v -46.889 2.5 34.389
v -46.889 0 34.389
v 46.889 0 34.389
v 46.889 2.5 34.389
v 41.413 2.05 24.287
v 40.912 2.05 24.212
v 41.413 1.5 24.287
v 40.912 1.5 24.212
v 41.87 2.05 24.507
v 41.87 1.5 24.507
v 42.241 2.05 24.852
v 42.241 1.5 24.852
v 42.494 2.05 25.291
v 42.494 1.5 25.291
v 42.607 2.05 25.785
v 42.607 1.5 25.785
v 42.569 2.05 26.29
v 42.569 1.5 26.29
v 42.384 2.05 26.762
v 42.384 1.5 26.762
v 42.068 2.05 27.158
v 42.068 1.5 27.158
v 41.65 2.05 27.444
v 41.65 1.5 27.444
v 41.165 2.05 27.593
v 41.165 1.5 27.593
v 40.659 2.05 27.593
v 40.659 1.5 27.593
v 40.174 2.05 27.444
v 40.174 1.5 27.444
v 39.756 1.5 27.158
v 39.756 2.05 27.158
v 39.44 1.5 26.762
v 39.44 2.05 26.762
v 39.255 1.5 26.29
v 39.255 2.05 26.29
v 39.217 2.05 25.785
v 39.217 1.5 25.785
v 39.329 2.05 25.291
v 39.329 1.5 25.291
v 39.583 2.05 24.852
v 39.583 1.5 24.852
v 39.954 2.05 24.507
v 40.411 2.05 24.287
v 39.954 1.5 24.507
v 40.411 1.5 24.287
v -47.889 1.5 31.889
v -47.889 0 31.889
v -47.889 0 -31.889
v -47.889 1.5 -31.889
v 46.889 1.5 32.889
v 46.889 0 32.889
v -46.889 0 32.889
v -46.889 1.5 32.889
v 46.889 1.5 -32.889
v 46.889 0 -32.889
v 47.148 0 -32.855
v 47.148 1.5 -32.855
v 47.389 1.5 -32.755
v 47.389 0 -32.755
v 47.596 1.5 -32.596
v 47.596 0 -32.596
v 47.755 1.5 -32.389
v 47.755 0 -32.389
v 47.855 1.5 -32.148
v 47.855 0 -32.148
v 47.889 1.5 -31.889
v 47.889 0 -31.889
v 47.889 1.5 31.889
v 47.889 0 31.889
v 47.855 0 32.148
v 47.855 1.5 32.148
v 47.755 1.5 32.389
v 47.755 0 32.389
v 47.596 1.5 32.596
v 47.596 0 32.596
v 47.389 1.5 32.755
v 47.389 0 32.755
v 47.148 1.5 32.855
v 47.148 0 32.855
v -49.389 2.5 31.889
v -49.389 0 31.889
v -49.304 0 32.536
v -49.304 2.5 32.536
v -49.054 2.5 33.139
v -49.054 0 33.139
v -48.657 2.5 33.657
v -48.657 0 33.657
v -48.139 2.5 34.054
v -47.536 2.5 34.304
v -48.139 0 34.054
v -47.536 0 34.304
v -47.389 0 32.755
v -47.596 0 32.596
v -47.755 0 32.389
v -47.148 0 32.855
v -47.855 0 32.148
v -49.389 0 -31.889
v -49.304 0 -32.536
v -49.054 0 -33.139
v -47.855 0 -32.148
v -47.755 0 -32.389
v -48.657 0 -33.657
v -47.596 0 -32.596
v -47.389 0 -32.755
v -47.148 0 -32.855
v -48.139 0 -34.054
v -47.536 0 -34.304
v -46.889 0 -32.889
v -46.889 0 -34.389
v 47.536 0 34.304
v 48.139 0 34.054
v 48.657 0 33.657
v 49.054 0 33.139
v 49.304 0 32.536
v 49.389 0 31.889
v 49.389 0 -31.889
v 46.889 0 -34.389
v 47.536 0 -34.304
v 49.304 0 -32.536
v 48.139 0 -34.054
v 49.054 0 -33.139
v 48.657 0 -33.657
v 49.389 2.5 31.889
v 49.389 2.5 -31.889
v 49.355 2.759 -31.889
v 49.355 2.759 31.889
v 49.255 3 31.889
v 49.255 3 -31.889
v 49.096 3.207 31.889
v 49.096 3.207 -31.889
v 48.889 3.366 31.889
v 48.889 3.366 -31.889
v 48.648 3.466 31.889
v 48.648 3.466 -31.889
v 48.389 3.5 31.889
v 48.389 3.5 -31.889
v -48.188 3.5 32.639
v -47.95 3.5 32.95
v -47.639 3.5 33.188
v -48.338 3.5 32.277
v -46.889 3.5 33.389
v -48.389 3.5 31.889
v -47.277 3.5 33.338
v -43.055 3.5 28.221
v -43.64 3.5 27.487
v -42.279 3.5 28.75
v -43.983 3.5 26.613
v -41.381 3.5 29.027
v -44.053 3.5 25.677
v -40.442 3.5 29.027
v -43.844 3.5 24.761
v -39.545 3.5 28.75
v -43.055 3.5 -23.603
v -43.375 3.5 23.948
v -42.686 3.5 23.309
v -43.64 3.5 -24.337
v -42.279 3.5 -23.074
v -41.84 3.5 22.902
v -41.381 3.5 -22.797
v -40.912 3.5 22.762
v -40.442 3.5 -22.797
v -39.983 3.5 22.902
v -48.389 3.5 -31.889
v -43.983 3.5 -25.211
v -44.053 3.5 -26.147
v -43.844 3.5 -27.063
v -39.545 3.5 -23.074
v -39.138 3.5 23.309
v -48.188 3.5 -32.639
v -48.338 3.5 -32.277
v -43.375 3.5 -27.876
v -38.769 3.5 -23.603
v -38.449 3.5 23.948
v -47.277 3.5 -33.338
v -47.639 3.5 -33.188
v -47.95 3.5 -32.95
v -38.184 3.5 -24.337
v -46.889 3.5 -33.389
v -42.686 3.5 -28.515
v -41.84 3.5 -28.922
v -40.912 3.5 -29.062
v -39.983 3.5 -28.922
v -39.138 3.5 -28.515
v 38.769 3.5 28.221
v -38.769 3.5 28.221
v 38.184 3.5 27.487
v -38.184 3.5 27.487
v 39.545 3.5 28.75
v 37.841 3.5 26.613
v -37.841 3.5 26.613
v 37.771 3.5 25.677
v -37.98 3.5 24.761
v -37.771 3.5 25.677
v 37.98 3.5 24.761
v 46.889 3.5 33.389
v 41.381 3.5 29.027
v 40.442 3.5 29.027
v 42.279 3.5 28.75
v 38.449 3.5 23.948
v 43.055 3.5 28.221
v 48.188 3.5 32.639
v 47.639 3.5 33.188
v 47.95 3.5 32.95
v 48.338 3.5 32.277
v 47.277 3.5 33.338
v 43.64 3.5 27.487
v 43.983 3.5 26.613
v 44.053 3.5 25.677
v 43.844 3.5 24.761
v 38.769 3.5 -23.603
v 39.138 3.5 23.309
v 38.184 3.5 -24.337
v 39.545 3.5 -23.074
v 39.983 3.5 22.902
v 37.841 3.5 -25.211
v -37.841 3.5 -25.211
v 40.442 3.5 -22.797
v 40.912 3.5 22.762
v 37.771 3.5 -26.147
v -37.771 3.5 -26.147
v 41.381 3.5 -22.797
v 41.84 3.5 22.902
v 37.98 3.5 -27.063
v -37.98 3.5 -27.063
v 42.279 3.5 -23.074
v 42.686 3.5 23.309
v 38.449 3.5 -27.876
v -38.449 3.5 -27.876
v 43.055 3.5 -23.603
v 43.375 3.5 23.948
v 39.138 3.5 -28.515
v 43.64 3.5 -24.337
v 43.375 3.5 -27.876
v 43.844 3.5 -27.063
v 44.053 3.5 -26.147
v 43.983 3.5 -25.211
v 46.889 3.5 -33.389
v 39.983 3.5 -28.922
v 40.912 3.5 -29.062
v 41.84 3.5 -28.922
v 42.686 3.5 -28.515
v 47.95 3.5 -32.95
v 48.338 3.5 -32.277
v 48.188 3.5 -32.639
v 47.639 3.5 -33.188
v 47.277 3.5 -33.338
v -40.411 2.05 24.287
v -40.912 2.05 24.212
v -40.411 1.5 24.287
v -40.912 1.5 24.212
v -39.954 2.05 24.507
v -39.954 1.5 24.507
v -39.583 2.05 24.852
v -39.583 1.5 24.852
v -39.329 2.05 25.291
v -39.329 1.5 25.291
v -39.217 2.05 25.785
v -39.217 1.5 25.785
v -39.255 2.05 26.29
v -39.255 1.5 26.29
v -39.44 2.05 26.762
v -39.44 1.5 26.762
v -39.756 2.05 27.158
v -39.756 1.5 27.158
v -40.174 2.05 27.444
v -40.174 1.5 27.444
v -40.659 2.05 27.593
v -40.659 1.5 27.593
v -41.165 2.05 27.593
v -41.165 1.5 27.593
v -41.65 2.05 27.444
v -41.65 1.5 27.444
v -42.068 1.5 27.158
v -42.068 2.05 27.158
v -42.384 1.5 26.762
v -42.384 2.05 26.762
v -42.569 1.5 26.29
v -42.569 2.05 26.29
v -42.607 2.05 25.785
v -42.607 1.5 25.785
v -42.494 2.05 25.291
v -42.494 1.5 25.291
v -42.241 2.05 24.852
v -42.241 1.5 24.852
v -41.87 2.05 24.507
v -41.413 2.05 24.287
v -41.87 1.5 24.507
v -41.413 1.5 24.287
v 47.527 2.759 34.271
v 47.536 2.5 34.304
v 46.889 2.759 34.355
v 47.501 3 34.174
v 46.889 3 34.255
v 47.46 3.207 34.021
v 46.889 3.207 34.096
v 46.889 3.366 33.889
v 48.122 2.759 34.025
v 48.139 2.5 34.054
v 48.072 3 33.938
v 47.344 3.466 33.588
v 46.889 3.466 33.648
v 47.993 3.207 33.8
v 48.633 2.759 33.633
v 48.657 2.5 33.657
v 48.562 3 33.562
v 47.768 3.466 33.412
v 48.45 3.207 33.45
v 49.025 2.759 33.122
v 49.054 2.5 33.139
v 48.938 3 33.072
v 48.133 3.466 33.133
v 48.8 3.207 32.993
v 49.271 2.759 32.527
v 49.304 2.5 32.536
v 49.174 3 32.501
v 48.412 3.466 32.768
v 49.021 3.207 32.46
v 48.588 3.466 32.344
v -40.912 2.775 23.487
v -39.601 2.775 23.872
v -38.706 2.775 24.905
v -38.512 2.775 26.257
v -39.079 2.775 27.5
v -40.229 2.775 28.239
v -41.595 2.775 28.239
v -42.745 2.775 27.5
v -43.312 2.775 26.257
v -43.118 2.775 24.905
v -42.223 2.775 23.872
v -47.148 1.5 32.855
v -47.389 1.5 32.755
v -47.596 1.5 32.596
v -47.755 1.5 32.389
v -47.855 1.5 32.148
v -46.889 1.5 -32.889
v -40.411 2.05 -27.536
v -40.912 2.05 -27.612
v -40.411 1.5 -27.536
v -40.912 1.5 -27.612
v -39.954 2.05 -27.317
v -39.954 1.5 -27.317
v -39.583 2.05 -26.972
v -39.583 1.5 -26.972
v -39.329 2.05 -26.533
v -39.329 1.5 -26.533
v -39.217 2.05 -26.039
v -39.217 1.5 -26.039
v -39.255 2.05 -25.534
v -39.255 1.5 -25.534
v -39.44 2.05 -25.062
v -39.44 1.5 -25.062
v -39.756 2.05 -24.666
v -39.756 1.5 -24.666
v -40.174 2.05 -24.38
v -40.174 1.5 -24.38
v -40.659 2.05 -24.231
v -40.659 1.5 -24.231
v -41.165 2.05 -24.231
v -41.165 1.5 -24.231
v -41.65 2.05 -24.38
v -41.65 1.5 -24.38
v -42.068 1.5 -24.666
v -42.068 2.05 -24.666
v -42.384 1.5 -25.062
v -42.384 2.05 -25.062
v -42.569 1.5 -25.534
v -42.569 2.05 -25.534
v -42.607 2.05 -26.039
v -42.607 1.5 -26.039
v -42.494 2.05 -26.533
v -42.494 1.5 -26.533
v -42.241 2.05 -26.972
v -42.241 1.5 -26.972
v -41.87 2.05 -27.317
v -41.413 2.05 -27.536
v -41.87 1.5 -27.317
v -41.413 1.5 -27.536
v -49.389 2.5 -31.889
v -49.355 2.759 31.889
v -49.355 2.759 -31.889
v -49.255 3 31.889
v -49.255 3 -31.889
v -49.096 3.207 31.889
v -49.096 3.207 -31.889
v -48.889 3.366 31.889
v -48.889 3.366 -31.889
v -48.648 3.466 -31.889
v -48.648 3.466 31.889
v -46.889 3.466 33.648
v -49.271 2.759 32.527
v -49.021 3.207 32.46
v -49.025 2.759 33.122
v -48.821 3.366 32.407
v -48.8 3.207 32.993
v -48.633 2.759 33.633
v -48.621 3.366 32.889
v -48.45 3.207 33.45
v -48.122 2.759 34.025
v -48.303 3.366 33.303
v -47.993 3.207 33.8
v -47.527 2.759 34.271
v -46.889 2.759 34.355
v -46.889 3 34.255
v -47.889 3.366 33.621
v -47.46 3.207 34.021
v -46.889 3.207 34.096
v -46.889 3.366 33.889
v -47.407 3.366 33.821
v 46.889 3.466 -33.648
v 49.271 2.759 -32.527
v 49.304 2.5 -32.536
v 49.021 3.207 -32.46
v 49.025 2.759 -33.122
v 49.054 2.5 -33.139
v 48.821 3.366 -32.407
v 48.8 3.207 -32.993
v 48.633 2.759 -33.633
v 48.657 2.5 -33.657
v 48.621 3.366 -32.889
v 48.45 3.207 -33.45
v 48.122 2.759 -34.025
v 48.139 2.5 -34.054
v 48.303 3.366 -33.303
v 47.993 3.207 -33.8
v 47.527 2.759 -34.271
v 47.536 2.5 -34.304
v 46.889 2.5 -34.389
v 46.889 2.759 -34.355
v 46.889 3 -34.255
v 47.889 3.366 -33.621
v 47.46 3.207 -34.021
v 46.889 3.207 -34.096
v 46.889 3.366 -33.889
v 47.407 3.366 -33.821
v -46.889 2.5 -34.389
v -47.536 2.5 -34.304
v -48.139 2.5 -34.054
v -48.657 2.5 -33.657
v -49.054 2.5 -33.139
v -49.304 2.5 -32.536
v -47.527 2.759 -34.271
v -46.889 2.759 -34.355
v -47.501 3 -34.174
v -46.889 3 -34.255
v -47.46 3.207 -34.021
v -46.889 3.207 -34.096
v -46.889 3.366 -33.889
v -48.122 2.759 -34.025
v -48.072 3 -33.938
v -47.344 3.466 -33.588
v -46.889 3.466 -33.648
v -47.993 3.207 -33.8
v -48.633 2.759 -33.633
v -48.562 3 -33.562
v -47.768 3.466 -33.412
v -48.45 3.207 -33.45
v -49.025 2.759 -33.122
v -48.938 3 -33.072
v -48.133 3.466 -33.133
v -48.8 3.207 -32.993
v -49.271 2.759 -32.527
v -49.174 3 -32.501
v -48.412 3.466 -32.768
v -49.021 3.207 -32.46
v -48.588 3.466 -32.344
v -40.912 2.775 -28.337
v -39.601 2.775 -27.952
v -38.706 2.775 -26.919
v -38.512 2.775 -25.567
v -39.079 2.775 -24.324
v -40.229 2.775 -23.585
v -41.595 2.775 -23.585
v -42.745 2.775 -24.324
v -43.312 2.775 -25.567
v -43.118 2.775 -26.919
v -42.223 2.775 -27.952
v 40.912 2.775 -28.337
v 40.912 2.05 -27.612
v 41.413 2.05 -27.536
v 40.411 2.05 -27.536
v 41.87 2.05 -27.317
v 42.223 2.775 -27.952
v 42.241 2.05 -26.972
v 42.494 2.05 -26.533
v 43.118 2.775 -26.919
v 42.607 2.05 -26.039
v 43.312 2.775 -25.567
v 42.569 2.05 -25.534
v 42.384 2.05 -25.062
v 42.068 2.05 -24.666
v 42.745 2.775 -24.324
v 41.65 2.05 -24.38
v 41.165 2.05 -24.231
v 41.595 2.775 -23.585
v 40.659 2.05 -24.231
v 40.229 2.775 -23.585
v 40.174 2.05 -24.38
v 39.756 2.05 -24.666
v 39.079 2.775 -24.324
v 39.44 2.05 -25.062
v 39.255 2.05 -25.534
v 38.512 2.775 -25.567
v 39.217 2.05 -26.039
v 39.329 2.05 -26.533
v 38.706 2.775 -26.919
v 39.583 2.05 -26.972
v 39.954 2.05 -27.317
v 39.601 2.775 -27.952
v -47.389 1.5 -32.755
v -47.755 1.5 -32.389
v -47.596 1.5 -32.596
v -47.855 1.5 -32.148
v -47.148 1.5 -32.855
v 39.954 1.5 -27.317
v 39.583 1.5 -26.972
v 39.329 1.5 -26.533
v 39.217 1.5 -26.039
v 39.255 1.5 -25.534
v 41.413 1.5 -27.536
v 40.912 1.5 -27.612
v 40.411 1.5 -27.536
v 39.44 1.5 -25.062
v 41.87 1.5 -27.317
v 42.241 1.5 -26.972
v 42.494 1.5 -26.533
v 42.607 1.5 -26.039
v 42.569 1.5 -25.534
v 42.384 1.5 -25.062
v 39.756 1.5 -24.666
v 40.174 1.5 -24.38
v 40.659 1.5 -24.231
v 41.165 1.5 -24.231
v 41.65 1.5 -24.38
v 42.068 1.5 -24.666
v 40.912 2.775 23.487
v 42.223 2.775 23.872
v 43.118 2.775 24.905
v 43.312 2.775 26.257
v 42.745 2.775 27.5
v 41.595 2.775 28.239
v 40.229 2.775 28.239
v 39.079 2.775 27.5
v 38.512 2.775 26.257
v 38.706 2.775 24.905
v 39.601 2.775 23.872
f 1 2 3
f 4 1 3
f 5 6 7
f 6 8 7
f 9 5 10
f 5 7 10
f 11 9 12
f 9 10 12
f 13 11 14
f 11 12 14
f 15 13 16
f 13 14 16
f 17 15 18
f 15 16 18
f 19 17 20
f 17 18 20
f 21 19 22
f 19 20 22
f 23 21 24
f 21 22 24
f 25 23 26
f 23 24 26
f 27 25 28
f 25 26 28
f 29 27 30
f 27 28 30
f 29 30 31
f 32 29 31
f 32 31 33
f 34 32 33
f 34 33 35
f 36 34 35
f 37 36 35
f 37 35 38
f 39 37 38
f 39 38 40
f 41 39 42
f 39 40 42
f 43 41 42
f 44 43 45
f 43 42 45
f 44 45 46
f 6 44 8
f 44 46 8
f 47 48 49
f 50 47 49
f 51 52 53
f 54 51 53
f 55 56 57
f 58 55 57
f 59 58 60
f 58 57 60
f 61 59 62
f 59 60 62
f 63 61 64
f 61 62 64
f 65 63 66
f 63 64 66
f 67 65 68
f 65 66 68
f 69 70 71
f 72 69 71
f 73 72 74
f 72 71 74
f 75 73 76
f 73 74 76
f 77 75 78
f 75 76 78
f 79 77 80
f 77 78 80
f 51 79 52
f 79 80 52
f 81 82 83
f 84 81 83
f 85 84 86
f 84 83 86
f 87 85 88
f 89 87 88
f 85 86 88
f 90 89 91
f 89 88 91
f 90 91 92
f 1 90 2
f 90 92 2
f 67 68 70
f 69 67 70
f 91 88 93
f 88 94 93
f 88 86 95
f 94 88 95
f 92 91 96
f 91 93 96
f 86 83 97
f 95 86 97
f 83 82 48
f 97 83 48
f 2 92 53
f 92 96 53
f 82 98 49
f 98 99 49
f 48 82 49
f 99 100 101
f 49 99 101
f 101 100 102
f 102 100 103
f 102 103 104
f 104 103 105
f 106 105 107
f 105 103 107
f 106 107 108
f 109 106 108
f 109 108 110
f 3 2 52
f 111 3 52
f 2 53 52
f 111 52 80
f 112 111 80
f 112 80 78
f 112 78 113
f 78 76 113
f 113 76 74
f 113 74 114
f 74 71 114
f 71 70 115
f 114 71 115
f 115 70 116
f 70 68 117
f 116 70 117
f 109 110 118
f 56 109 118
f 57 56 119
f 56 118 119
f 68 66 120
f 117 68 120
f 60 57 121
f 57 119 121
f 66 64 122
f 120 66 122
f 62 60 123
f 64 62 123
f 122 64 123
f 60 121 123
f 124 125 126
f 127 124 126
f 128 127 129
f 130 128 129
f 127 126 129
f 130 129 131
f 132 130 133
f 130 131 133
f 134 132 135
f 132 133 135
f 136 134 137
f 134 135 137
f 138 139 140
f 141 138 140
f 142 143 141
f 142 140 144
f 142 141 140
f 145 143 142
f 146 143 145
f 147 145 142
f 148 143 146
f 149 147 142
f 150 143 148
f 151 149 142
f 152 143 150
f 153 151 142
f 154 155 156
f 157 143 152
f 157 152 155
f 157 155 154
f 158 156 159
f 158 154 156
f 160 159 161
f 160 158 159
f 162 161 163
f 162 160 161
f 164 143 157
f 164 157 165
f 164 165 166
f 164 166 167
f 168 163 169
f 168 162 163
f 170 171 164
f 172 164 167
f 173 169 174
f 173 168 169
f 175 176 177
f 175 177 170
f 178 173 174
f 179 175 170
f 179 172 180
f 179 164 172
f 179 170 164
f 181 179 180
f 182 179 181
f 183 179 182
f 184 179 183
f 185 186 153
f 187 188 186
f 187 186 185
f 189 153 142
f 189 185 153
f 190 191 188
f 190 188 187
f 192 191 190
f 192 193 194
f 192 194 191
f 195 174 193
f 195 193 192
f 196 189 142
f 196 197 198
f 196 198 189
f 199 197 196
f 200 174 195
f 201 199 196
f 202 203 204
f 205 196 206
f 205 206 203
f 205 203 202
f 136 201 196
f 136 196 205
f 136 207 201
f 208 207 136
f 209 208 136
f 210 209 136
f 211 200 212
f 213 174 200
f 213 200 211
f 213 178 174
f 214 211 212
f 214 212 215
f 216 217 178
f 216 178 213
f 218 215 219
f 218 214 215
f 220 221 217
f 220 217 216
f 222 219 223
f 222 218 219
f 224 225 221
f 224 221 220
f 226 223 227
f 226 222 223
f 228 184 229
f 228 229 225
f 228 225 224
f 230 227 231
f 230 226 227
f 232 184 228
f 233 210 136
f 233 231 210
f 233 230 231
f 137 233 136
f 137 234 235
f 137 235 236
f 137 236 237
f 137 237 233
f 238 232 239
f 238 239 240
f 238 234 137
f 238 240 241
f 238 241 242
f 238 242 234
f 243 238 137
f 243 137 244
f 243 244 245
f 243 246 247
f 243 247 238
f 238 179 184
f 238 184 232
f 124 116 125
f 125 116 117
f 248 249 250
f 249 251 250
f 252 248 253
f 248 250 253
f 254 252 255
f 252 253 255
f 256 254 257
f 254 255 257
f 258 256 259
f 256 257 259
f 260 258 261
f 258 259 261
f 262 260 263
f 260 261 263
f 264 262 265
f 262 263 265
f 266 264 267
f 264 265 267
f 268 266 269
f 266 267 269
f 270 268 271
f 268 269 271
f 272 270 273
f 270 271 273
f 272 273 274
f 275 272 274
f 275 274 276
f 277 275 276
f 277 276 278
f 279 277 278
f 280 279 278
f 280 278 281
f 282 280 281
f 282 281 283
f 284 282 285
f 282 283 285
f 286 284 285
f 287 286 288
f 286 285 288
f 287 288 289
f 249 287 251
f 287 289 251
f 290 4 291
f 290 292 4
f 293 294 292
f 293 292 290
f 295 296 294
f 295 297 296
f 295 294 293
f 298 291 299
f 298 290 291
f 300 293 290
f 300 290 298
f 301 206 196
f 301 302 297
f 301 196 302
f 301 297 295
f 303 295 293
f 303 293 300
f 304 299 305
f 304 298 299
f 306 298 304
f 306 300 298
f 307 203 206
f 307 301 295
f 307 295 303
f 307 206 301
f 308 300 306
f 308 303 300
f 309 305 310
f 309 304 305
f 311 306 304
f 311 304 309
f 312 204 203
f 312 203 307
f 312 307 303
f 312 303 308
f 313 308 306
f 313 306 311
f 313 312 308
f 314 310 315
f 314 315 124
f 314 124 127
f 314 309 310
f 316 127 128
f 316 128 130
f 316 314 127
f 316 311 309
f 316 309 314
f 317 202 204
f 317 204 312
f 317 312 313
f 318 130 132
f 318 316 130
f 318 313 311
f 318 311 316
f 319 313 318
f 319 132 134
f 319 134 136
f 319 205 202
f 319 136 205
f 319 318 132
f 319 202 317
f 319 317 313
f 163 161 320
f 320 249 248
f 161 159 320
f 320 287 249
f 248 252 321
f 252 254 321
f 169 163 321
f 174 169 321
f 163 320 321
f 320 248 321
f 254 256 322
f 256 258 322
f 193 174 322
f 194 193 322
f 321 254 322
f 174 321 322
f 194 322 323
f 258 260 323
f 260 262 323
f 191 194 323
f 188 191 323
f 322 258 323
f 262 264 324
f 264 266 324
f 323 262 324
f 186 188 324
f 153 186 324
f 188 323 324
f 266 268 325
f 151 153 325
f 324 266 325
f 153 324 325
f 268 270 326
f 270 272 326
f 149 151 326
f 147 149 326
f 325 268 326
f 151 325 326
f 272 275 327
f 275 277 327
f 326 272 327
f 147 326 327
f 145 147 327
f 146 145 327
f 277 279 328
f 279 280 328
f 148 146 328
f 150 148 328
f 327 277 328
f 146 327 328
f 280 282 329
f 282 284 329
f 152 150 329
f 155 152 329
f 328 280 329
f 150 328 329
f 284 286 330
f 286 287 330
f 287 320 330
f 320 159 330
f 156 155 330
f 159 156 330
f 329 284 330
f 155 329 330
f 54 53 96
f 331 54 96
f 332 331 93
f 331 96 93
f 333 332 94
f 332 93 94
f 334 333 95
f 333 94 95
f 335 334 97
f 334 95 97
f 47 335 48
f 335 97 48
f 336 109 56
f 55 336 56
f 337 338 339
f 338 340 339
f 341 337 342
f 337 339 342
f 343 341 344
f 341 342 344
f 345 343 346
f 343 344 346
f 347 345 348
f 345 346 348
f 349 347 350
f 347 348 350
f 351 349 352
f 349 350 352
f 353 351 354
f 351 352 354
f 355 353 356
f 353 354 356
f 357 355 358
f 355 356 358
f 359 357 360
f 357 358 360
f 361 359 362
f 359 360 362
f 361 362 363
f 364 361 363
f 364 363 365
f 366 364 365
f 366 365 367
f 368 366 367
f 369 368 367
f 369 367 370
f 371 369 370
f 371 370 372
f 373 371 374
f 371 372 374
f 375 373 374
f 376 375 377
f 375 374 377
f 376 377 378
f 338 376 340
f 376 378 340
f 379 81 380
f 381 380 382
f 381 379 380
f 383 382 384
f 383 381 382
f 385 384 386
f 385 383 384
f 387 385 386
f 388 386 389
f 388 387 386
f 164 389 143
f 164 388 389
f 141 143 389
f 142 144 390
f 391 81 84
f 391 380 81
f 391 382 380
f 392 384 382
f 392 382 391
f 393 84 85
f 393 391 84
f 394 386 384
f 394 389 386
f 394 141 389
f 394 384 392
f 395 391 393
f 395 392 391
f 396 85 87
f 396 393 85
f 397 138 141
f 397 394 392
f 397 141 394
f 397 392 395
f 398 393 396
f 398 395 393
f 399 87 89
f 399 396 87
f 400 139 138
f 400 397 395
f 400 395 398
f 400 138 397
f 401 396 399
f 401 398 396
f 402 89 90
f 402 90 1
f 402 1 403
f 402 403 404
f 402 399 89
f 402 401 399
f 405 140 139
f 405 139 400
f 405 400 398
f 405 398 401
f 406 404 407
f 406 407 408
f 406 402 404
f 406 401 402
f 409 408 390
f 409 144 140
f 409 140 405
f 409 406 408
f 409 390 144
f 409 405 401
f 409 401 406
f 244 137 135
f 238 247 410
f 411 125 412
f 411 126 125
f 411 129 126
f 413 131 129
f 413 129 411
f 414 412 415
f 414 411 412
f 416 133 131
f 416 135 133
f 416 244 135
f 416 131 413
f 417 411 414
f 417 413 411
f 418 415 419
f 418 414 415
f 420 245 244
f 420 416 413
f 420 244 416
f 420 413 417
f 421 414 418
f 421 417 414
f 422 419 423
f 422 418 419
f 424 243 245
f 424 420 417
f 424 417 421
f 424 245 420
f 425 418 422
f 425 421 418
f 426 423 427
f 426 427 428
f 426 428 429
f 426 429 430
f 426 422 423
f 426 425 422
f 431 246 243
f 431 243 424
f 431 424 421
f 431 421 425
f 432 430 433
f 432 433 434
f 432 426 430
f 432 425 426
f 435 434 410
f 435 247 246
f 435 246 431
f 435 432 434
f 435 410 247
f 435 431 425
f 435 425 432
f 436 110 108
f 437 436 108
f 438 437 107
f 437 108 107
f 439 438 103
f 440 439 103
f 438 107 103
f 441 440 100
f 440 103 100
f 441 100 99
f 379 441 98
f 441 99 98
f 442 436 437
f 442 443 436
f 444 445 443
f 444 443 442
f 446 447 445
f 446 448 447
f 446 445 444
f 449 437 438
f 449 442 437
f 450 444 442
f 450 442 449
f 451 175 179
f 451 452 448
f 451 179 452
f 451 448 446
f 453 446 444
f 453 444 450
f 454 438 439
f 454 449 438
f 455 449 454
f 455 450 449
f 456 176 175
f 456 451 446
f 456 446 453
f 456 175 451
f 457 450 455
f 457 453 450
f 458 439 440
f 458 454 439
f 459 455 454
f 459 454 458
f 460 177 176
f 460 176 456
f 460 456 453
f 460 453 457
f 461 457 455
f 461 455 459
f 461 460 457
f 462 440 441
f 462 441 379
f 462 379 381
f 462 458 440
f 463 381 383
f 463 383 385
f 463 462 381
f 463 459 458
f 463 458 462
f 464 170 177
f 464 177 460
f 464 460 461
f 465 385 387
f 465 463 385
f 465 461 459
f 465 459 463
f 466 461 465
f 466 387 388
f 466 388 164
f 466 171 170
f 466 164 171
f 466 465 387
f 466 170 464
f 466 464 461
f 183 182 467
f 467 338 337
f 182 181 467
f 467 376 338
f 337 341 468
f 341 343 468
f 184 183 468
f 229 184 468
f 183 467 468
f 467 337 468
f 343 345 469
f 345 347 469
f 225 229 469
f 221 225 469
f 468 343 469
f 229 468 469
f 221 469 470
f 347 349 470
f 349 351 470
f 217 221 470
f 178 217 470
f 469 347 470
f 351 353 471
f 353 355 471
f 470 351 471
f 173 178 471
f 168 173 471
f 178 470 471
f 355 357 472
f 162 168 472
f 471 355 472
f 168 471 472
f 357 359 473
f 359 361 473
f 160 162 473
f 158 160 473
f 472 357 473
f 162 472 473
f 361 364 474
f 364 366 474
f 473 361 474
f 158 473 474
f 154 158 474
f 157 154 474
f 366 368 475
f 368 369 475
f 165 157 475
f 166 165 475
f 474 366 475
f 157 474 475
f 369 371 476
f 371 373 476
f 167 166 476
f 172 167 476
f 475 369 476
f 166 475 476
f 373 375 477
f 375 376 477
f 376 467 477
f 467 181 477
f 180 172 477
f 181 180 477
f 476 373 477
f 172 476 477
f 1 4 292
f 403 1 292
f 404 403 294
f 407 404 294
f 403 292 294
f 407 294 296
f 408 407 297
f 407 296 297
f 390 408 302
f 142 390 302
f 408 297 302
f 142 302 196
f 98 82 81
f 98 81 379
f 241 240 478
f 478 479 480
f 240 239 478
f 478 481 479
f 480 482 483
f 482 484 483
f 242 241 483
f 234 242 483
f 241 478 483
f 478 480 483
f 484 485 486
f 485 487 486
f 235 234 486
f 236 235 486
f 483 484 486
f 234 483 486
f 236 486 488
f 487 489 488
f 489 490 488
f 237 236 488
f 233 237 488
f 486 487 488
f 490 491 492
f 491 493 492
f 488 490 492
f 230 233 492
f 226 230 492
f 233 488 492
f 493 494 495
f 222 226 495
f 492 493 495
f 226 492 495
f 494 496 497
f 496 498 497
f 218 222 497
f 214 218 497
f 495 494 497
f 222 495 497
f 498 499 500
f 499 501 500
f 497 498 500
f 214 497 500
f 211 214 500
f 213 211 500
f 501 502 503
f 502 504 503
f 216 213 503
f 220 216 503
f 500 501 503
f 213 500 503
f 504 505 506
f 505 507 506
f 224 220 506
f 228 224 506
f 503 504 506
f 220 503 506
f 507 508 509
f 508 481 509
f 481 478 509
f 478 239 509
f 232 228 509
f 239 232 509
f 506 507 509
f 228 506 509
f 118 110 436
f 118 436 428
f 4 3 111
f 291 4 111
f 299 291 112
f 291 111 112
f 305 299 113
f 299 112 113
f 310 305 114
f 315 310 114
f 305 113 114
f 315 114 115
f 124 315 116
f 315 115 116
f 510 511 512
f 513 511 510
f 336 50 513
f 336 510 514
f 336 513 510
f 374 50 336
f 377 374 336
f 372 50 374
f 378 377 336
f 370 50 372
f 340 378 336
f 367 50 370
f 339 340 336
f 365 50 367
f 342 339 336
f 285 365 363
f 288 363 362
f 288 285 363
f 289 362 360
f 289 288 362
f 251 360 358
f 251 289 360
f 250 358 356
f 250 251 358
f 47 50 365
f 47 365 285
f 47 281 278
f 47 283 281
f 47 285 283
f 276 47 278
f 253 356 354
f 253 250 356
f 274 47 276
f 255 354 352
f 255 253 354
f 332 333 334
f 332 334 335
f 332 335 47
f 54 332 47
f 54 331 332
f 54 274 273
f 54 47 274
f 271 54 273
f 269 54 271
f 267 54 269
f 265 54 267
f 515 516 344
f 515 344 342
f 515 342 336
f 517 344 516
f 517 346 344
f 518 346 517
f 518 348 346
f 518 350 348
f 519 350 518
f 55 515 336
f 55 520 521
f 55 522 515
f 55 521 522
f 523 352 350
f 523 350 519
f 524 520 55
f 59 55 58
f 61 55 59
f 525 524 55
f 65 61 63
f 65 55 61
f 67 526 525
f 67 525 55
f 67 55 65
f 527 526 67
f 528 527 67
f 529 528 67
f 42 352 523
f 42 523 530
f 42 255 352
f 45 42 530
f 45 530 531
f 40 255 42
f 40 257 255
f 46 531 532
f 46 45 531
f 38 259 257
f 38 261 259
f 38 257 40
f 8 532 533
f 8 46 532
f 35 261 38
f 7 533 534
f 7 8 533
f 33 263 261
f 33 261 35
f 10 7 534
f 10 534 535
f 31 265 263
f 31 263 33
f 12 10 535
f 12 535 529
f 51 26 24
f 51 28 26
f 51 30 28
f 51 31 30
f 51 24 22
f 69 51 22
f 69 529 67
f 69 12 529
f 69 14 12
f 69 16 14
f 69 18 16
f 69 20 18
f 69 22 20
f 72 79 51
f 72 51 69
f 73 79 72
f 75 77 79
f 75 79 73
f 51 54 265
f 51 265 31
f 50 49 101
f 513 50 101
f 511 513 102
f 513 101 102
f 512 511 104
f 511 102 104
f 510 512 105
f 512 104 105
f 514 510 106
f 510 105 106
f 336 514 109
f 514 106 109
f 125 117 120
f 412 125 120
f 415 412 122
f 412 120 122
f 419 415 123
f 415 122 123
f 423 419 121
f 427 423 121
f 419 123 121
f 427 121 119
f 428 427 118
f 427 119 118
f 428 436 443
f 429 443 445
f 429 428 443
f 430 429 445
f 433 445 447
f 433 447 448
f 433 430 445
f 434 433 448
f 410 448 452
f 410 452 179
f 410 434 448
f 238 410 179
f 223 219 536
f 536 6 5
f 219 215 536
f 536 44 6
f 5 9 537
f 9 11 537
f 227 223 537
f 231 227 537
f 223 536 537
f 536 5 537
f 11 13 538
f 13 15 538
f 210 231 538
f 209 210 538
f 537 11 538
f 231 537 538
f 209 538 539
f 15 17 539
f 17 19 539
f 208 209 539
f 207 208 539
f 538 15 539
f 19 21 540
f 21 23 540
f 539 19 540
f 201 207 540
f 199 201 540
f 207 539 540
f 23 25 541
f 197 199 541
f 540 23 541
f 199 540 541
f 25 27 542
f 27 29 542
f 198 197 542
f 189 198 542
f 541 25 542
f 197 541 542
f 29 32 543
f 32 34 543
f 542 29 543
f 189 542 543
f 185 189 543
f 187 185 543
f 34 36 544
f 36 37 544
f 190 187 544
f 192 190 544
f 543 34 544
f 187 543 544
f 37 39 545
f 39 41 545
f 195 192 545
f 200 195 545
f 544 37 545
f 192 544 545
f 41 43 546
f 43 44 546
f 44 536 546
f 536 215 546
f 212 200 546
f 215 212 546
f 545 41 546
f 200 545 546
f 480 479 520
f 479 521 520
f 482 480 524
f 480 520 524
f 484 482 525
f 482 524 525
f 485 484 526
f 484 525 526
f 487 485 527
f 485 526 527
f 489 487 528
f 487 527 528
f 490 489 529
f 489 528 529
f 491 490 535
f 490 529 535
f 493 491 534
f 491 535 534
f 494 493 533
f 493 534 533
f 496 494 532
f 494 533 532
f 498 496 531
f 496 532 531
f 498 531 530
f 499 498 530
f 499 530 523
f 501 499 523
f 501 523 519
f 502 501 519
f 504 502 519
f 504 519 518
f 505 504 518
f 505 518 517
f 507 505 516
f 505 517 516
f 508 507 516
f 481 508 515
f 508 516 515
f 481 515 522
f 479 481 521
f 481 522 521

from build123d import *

# Parameters (mm, degrees)
SKETCH2_W                                           = 98.778145
SKETCH2_H                                           = 68.778145
BOSS_EXTRUDE1_DEPTH                                 = 3.5
FILLET1_R                                           = 1
FILLET2_R                                           = 2.5
CUT_EXTRUDE1_DEPTH                                  = 1.5
CSK_FOR_M3_COUNTERSUNK_FLAT_HEAD_SCREW1_D           = 3.4
CSK_FOR_M3_COUNTERSUNK_FLAT_HEAD_SCREW1_DEPTH       = 10
CSK_FOR_M3_COUNTERSUNK_FLAT_HEAD_SCREW1_CSINK_D     = 6.3
CSK_FOR_M3_COUNTERSUNK_FLAT_HEAD_SCREW1_CSINK_ANGLE = 90
CSK_FOR_M3_COUNTERSUNK_FLAT_HEAD_SCREW1_TIP         = 1.021463052


with BuildPart() as part:
    # Sketch2 → Boss-Extrude1 (new body)
    with BuildSketch(Plane(origin=(0, 0, 0), x_dir=(1, 0, 0), z_dir=(0, 1, 0))):
        Rectangle(SKETCH2_W, SKETCH2_H)
    extrude(amount=BOSS_EXTRUDE1_DEPTH)

    # Fillet1
    fillet1_edges = [part.edges().sort_by_distance(p)[0] for p in [
        (49.3890725, 3.5, 0),
        (0, 3.5, -34.3890725),
        (-49.3890725, 3.5, 0),
        (0, 3.5, 34.3890725),
    ]]
    fillet(fillet1_edges, radius=FILLET1_R)

    # Fillet2
    # the kernel refuses this fillet: 2.5 mm, written as the material it takes off along each edge
    with BuildSketch(Plane(origin=(46.8890725, 3.5, 31.8890725), x_dir=(0, 0, 1), z_dir=(-1, 0, 0))) as fillet2_piece_1:
        with BuildLine():
            CenterArc((1.5, -1), 1, 0, 90)
            Line((2.5, -1), (2.5, 0))
            Line((2.5, 0), (1.5, 0))
        make_face()
    revolve(axis=Axis((46.8890725, 3.5, 31.8890725), (0, 1, 0)), revolution_arc=90, mode=Mode.SUBTRACT)
    with BuildSketch(Plane(origin=(-46.8890725, 3.5, 31.8890725), x_dir=(-1, 0, 0), z_dir=(0, 0, -1))) as fillet2_piece_2:
        with BuildLine():
            CenterArc((1.5, -1), 1, 0, 90)
            Line((2.5, -1), (2.5, 0))
            Line((2.5, 0), (1.5, 0))
        make_face()
    revolve(axis=Axis((-46.8890725, 3.5, 31.8890725), (0, 1, 0)), revolution_arc=90, mode=Mode.SUBTRACT)
    with BuildSketch(Plane(origin=(46.8890725, 3.5, -31.8890725), x_dir=(1, 0, 0), z_dir=(0, 0, 1))) as fillet2_piece_3:
        with BuildLine():
            CenterArc((1.5, -1), 1, 0, 90)
            Line((2.5, -1), (2.5, 0))
            Line((2.5, 0), (1.5, 0))
        make_face()
    revolve(axis=Axis((46.8890725, 3.5, -31.8890725), (0, 1, 0)), revolution_arc=90, mode=Mode.SUBTRACT)
    with BuildSketch(Plane(origin=(-46.8890725, 3.5, -31.8890725), x_dir=(0, 0, -1), z_dir=(1, 0, 0))) as fillet2_piece_4:
        with BuildLine():
            CenterArc((1.5, -1), 1, 0, 90)
            Line((2.5, -1), (2.5, 0))
            Line((2.5, 0), (1.5, 0))
        make_face()
    revolve(axis=Axis((-46.8890725, 3.5, -31.8890725), (0, 1, 0)), revolution_arc=90, mode=Mode.SUBTRACT)
    with BuildSketch(Plane(origin=(-49.3890725, -6.25, -34.3890725), x_dir=(0, 0, 1), z_dir=(0, 1, 0)), Plane(origin=(-49.3890725, -6.25, 34.3890725), x_dir=(1, 0, 0), z_dir=(0, 1, 0))) as fillet2_piece_5:
        with BuildLine():
            CenterArc((FILLET2_R, FILLET2_R), FILLET2_R, 180, 90)
            Line((0, FILLET2_R), (0, 0))
            Line((0, 0), (FILLET2_R, 0))
        make_face()
    extrude(amount=9.75, mode=Mode.SUBTRACT)
    with BuildSketch(Plane(origin=(49.3890725, -6.25, -34.3890725), x_dir=(0, 0, 1), z_dir=(0, 1, 0)), Plane(origin=(49.3890725, -6.25, 34.3890725), x_dir=(-1, 0, 0), z_dir=(0, 1, 0))) as fillet2_piece_6:
        with BuildLine():
            CenterArc((FILLET2_R, -FILLET2_R), FILLET2_R, 90, 90)
            Line((0, -FILLET2_R), (0, 0))
            Line((0, 0), (FILLET2_R, 0))
        make_face()
    extrude(amount=9.75, mode=Mode.SUBTRACT)

    # Sketch3 → Cut-Extrude1 (cut)
    with BuildSketch(Plane.XZ):
        with BuildLine():
            Line((47.8890725, -31.8890725), (47.8890725, 31.8890725))
            ThreePointArc((47.8890725, 31.8890725), (47.596179281, 32.596179281), (46.8890725, 32.8890725))
            Line((46.8890725, 32.8890725), (-46.8890725, 32.8890725))
            ThreePointArc((-46.8890725, 32.8890725), (-47.596179281, 32.596179281), (-47.8890725, 31.8890725))
            Line((-47.8890725, 31.8890725), (-47.8890725, -31.8890725))
            ThreePointArc((-47.8890725, -31.8890725), (-47.596179281, -32.596179281), (-46.8890725, -32.8890725))
            Line((-46.8890725, -32.8890725), (46.8890725, -32.8890725))
            ThreePointArc((46.8890725, -32.8890725), (47.596179281, -32.596179281), (47.8890725, -31.8890725))
        make_face()
    extrude(amount=-CUT_EXTRUDE1_DEPTH, mode=Mode.SUBTRACT)

    # CSK for M3 Countersunk Flat Head Screw1
    with Locations(Plane(origin=(-40.911963263, 3.5, -25.911963263), x_dir=(0, 0, 1), z_dir=(0, 1, 0))):
        with Locations((0, 0), (0, 81.823926071), (51.823926071, 81.823926071), (51.823926071, 0)):
            CounterSinkHole(CSK_FOR_M3_COUNTERSUNK_FLAT_HEAD_SCREW1_D / 2, CSK_FOR_M3_COUNTERSUNK_FLAT_HEAD_SCREW1_CSINK_D / 2, depth=CSK_FOR_M3_COUNTERSUNK_FLAT_HEAD_SCREW1_DEPTH, counter_sink_angle=CSK_FOR_M3_COUNTERSUNK_FLAT_HEAD_SCREW1_CSINK_ANGLE)
            with Locations((0, 0, -(CSK_FOR_M3_COUNTERSUNK_FLAT_HEAD_SCREW1_DEPTH + CSK_FOR_M3_COUNTERSUNK_FLAT_HEAD_SCREW1_TIP / 2))):  # 118° drill point
                Cone(0, CSK_FOR_M3_COUNTERSUNK_FLAT_HEAD_SCREW1_D / 2, CSK_FOR_M3_COUNTERSUNK_FLAT_HEAD_SCREW1_TIP, mode=Mode.SUBTRACT)


solid = part.part
